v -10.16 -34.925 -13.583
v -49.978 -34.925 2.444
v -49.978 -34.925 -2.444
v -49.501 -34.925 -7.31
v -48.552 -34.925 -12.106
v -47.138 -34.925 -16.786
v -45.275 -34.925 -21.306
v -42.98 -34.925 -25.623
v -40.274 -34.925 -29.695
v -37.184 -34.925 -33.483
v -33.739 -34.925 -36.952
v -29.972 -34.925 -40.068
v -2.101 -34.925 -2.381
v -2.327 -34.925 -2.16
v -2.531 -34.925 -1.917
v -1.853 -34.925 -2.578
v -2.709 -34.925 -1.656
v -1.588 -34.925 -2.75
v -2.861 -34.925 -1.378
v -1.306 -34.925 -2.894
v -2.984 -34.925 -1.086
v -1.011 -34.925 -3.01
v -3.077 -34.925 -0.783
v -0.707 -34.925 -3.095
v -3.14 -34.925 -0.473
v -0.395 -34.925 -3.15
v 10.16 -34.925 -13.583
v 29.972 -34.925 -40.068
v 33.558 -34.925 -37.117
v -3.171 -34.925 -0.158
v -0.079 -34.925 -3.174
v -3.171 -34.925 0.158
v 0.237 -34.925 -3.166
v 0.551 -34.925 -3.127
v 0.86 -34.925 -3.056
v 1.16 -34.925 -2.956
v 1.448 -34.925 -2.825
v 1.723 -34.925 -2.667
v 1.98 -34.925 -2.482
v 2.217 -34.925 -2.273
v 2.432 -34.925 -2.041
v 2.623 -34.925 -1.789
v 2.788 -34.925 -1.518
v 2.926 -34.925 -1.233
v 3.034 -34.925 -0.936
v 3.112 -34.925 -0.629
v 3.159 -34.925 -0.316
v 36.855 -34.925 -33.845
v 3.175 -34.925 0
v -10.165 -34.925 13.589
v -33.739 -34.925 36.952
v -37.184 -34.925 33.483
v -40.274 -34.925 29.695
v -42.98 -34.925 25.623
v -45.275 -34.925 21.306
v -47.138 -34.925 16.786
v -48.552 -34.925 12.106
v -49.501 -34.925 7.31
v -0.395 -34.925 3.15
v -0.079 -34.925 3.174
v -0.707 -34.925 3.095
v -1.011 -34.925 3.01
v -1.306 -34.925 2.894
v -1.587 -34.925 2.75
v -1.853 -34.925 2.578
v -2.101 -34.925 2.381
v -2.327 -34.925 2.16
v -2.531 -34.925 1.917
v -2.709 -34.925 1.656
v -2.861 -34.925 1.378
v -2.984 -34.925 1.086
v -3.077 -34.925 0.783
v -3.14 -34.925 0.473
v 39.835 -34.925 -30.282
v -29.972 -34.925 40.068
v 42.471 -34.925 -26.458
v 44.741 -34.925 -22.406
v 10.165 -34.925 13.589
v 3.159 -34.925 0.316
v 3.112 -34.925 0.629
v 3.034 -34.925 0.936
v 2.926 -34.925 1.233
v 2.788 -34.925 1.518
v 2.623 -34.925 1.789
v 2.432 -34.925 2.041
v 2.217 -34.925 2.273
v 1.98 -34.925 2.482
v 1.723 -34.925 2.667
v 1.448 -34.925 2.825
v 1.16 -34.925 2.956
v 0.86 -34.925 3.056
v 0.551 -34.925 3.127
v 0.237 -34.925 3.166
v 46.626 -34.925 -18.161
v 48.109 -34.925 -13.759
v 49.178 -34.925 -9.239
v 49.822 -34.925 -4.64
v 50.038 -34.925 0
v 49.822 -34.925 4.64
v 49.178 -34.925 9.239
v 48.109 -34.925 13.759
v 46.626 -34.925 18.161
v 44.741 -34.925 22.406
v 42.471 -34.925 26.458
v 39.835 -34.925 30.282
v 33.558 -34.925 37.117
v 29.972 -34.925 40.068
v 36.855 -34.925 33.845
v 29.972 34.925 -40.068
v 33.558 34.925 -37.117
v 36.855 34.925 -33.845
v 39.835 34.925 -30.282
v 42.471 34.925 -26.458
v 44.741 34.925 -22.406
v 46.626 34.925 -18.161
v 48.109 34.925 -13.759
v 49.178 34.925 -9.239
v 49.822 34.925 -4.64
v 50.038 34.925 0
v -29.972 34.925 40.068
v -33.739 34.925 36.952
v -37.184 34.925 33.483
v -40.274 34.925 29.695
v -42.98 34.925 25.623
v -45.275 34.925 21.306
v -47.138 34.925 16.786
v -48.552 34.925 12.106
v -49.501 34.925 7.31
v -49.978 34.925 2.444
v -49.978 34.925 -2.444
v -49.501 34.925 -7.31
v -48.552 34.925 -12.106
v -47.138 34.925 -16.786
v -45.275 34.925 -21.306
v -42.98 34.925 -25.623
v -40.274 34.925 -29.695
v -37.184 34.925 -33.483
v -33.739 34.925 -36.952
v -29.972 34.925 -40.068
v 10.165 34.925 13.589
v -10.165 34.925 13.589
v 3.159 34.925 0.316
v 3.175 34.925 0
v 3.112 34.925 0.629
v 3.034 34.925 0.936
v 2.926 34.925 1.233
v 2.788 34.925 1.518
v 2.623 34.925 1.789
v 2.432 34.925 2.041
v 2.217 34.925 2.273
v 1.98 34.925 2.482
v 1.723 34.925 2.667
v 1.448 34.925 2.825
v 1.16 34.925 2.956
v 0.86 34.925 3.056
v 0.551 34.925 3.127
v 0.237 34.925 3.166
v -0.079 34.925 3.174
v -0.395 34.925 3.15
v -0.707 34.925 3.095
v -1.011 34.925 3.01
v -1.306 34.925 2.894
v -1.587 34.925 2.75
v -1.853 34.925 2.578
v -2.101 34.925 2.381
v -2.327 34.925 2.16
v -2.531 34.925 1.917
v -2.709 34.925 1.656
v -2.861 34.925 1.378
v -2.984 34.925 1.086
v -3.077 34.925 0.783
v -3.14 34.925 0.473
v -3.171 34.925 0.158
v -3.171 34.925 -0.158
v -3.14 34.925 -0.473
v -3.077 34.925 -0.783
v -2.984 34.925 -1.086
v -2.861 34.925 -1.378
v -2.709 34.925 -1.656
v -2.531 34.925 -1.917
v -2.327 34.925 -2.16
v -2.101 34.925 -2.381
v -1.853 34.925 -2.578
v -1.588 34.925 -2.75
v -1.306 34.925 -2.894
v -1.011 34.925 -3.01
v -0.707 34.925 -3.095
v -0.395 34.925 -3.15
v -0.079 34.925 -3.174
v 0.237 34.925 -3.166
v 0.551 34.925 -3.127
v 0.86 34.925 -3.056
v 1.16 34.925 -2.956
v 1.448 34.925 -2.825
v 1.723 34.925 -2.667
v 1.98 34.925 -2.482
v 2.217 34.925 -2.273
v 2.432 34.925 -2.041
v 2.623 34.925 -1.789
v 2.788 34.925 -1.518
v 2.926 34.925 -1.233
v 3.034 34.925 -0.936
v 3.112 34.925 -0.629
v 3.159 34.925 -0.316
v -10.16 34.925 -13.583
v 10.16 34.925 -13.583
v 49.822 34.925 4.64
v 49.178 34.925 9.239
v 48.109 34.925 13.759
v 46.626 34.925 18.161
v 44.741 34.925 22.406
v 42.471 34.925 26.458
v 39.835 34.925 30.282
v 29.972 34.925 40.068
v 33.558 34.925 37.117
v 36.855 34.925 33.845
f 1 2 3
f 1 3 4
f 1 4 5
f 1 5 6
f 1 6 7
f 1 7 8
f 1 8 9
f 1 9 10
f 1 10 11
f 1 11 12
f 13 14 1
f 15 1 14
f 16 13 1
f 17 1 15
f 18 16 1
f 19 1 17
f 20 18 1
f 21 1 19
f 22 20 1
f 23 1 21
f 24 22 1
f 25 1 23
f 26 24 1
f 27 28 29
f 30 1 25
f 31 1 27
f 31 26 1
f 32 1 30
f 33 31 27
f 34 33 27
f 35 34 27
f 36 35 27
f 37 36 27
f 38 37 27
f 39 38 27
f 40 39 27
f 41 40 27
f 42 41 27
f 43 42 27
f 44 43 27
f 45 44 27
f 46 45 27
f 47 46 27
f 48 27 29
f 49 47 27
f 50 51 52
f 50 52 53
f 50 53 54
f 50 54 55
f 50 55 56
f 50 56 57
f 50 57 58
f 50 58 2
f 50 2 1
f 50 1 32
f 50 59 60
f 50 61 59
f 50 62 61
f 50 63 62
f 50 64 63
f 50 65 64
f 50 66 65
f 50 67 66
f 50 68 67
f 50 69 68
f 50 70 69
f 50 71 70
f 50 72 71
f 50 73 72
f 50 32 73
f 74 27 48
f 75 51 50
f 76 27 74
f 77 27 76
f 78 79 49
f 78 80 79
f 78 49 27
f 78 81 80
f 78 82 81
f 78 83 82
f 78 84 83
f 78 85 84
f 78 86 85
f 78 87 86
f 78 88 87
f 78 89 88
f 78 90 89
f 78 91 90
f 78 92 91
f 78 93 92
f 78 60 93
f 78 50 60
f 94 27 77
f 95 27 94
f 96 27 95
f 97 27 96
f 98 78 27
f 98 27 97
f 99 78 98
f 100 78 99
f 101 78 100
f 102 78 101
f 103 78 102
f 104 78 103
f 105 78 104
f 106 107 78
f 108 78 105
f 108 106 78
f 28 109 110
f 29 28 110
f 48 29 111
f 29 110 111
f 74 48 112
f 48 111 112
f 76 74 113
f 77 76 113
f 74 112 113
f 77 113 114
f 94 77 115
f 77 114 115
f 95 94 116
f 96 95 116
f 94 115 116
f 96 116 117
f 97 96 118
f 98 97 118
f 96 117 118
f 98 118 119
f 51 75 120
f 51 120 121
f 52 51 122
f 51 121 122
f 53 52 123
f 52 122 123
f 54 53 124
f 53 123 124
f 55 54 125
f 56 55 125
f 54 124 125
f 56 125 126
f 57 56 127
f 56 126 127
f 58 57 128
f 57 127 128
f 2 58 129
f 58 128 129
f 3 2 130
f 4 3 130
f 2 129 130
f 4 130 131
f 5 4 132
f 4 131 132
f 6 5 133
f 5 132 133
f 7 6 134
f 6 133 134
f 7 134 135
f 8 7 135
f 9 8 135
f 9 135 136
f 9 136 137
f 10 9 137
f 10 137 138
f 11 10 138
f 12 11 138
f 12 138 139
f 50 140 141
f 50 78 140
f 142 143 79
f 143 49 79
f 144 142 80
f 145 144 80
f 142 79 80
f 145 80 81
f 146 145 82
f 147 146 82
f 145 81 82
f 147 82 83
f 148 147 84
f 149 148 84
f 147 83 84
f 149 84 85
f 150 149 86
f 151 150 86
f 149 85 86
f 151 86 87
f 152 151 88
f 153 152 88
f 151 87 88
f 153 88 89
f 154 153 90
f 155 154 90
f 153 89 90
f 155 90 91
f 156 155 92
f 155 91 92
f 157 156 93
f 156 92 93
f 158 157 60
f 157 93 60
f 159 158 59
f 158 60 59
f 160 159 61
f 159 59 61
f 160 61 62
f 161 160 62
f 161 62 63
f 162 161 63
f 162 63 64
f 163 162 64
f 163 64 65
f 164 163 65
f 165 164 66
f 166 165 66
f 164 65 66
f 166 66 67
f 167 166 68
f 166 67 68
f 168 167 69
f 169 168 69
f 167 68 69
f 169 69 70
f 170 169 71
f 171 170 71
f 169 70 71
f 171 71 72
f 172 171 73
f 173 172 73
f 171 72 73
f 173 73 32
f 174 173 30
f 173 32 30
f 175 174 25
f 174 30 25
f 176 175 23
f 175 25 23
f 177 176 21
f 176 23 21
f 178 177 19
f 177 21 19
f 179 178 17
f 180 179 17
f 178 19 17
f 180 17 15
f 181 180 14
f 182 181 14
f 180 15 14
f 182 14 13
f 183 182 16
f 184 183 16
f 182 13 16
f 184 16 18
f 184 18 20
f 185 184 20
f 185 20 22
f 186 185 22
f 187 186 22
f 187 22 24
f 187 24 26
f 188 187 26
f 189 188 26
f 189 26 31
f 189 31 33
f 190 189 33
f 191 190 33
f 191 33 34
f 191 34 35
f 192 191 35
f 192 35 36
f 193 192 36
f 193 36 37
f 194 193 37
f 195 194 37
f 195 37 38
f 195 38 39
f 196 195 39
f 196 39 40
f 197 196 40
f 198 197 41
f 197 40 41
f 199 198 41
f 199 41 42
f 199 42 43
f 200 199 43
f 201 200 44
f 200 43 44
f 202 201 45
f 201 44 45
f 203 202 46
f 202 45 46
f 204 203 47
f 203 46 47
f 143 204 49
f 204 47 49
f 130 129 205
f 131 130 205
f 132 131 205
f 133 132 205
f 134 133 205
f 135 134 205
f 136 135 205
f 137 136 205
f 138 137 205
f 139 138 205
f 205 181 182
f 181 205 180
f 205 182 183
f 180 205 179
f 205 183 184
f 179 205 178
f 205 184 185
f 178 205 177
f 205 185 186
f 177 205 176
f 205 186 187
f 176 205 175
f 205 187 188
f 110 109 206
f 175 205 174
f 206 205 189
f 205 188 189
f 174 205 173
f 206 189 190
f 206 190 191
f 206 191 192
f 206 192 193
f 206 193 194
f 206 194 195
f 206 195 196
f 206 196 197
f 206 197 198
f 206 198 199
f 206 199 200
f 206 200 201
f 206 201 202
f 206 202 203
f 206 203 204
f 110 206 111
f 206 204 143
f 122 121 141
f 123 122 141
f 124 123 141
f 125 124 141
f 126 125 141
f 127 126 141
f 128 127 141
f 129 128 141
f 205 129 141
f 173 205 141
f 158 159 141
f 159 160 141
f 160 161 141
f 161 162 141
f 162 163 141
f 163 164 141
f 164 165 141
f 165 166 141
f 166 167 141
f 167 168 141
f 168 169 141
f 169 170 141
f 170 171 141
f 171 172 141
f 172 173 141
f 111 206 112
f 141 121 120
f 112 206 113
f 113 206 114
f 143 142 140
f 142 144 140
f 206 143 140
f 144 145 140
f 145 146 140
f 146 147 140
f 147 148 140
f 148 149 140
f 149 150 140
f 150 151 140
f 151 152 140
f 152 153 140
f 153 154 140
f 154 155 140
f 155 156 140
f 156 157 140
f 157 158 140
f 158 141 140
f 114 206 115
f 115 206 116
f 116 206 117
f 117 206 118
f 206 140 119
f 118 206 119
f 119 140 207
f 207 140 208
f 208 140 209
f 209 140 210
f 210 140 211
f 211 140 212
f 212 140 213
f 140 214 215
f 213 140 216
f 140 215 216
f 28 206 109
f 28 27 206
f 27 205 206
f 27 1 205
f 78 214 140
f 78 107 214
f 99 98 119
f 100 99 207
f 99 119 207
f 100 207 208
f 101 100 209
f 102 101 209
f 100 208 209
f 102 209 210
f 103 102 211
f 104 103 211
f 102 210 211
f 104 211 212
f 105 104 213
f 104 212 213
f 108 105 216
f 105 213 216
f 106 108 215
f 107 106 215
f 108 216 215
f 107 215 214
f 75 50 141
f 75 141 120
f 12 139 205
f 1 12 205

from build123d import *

# Parameters (mm, degrees)
F1_DEPTH = 34.925
F2_D     = 3.556
F2_DEPTH = 34.926
F3_R     = 3.175
F4_DEPTH = 34.925


with BuildPart() as f1:
    # F0 (on Front) → F1 (new body, symmetric)
    with BuildSketch(Plane.XZ):
        Polygon((0, 0), (10.1648431926, 13.589), (-10.1648431926, 13.589), align=None)
        Polygon((-10.16, -13.5825253163), (10.16, -13.5825253163), (0, 0), align=None)
        with BuildLine():
            ThreePointArc((29.972, -40.068449683), (44.7411464985, -22.4060539587), (50.038, 0))
            ThreePointArc((50.038, 0), (44.7411464985, 22.4060539587), (29.972, 40.068449683))
            Line((29.972, 40.068449683), (10.1648431926, 13.589))
            Line((10.1648431926, 13.589), (0, 0))
            Line((0, 0), (10.16, -13.5825253163))
            Line((10.16, -13.5825253163), (29.972, -40.068449683))
        make_face()
        with BuildLine():
            Line((-10.1648431926, 13.589), (-29.972, 40.068449683))
            ThreePointArc((-29.972, 40.068449683), (-50.038, 0), (-29.972, -40.068449683))
            Line((-29.972, -40.068449683), (-10.16, -13.5825253163))
            Line((-10.16, -13.5825253163), (0, 0))
            Line((0, 0), (-10.1648431926, 13.589))
        make_face()
    extrude(amount=F1_DEPTH, both=True)

    # F2 (through all, one way)
    with BuildSketch(Plane.XZ):
        with Locations((0, 0)):
            Circle(F2_D / 2)
    extrude(amount=-F2_DEPTH, mode=Mode.SUBTRACT)

    # F3 (on Front) → F4 (cut, symmetric)
    with BuildSketch(Plane.XZ):
        Circle(F3_R)
    extrude(amount=F4_DEPTH, both=True, mode=Mode.SUBTRACT)


solid = f1.part
